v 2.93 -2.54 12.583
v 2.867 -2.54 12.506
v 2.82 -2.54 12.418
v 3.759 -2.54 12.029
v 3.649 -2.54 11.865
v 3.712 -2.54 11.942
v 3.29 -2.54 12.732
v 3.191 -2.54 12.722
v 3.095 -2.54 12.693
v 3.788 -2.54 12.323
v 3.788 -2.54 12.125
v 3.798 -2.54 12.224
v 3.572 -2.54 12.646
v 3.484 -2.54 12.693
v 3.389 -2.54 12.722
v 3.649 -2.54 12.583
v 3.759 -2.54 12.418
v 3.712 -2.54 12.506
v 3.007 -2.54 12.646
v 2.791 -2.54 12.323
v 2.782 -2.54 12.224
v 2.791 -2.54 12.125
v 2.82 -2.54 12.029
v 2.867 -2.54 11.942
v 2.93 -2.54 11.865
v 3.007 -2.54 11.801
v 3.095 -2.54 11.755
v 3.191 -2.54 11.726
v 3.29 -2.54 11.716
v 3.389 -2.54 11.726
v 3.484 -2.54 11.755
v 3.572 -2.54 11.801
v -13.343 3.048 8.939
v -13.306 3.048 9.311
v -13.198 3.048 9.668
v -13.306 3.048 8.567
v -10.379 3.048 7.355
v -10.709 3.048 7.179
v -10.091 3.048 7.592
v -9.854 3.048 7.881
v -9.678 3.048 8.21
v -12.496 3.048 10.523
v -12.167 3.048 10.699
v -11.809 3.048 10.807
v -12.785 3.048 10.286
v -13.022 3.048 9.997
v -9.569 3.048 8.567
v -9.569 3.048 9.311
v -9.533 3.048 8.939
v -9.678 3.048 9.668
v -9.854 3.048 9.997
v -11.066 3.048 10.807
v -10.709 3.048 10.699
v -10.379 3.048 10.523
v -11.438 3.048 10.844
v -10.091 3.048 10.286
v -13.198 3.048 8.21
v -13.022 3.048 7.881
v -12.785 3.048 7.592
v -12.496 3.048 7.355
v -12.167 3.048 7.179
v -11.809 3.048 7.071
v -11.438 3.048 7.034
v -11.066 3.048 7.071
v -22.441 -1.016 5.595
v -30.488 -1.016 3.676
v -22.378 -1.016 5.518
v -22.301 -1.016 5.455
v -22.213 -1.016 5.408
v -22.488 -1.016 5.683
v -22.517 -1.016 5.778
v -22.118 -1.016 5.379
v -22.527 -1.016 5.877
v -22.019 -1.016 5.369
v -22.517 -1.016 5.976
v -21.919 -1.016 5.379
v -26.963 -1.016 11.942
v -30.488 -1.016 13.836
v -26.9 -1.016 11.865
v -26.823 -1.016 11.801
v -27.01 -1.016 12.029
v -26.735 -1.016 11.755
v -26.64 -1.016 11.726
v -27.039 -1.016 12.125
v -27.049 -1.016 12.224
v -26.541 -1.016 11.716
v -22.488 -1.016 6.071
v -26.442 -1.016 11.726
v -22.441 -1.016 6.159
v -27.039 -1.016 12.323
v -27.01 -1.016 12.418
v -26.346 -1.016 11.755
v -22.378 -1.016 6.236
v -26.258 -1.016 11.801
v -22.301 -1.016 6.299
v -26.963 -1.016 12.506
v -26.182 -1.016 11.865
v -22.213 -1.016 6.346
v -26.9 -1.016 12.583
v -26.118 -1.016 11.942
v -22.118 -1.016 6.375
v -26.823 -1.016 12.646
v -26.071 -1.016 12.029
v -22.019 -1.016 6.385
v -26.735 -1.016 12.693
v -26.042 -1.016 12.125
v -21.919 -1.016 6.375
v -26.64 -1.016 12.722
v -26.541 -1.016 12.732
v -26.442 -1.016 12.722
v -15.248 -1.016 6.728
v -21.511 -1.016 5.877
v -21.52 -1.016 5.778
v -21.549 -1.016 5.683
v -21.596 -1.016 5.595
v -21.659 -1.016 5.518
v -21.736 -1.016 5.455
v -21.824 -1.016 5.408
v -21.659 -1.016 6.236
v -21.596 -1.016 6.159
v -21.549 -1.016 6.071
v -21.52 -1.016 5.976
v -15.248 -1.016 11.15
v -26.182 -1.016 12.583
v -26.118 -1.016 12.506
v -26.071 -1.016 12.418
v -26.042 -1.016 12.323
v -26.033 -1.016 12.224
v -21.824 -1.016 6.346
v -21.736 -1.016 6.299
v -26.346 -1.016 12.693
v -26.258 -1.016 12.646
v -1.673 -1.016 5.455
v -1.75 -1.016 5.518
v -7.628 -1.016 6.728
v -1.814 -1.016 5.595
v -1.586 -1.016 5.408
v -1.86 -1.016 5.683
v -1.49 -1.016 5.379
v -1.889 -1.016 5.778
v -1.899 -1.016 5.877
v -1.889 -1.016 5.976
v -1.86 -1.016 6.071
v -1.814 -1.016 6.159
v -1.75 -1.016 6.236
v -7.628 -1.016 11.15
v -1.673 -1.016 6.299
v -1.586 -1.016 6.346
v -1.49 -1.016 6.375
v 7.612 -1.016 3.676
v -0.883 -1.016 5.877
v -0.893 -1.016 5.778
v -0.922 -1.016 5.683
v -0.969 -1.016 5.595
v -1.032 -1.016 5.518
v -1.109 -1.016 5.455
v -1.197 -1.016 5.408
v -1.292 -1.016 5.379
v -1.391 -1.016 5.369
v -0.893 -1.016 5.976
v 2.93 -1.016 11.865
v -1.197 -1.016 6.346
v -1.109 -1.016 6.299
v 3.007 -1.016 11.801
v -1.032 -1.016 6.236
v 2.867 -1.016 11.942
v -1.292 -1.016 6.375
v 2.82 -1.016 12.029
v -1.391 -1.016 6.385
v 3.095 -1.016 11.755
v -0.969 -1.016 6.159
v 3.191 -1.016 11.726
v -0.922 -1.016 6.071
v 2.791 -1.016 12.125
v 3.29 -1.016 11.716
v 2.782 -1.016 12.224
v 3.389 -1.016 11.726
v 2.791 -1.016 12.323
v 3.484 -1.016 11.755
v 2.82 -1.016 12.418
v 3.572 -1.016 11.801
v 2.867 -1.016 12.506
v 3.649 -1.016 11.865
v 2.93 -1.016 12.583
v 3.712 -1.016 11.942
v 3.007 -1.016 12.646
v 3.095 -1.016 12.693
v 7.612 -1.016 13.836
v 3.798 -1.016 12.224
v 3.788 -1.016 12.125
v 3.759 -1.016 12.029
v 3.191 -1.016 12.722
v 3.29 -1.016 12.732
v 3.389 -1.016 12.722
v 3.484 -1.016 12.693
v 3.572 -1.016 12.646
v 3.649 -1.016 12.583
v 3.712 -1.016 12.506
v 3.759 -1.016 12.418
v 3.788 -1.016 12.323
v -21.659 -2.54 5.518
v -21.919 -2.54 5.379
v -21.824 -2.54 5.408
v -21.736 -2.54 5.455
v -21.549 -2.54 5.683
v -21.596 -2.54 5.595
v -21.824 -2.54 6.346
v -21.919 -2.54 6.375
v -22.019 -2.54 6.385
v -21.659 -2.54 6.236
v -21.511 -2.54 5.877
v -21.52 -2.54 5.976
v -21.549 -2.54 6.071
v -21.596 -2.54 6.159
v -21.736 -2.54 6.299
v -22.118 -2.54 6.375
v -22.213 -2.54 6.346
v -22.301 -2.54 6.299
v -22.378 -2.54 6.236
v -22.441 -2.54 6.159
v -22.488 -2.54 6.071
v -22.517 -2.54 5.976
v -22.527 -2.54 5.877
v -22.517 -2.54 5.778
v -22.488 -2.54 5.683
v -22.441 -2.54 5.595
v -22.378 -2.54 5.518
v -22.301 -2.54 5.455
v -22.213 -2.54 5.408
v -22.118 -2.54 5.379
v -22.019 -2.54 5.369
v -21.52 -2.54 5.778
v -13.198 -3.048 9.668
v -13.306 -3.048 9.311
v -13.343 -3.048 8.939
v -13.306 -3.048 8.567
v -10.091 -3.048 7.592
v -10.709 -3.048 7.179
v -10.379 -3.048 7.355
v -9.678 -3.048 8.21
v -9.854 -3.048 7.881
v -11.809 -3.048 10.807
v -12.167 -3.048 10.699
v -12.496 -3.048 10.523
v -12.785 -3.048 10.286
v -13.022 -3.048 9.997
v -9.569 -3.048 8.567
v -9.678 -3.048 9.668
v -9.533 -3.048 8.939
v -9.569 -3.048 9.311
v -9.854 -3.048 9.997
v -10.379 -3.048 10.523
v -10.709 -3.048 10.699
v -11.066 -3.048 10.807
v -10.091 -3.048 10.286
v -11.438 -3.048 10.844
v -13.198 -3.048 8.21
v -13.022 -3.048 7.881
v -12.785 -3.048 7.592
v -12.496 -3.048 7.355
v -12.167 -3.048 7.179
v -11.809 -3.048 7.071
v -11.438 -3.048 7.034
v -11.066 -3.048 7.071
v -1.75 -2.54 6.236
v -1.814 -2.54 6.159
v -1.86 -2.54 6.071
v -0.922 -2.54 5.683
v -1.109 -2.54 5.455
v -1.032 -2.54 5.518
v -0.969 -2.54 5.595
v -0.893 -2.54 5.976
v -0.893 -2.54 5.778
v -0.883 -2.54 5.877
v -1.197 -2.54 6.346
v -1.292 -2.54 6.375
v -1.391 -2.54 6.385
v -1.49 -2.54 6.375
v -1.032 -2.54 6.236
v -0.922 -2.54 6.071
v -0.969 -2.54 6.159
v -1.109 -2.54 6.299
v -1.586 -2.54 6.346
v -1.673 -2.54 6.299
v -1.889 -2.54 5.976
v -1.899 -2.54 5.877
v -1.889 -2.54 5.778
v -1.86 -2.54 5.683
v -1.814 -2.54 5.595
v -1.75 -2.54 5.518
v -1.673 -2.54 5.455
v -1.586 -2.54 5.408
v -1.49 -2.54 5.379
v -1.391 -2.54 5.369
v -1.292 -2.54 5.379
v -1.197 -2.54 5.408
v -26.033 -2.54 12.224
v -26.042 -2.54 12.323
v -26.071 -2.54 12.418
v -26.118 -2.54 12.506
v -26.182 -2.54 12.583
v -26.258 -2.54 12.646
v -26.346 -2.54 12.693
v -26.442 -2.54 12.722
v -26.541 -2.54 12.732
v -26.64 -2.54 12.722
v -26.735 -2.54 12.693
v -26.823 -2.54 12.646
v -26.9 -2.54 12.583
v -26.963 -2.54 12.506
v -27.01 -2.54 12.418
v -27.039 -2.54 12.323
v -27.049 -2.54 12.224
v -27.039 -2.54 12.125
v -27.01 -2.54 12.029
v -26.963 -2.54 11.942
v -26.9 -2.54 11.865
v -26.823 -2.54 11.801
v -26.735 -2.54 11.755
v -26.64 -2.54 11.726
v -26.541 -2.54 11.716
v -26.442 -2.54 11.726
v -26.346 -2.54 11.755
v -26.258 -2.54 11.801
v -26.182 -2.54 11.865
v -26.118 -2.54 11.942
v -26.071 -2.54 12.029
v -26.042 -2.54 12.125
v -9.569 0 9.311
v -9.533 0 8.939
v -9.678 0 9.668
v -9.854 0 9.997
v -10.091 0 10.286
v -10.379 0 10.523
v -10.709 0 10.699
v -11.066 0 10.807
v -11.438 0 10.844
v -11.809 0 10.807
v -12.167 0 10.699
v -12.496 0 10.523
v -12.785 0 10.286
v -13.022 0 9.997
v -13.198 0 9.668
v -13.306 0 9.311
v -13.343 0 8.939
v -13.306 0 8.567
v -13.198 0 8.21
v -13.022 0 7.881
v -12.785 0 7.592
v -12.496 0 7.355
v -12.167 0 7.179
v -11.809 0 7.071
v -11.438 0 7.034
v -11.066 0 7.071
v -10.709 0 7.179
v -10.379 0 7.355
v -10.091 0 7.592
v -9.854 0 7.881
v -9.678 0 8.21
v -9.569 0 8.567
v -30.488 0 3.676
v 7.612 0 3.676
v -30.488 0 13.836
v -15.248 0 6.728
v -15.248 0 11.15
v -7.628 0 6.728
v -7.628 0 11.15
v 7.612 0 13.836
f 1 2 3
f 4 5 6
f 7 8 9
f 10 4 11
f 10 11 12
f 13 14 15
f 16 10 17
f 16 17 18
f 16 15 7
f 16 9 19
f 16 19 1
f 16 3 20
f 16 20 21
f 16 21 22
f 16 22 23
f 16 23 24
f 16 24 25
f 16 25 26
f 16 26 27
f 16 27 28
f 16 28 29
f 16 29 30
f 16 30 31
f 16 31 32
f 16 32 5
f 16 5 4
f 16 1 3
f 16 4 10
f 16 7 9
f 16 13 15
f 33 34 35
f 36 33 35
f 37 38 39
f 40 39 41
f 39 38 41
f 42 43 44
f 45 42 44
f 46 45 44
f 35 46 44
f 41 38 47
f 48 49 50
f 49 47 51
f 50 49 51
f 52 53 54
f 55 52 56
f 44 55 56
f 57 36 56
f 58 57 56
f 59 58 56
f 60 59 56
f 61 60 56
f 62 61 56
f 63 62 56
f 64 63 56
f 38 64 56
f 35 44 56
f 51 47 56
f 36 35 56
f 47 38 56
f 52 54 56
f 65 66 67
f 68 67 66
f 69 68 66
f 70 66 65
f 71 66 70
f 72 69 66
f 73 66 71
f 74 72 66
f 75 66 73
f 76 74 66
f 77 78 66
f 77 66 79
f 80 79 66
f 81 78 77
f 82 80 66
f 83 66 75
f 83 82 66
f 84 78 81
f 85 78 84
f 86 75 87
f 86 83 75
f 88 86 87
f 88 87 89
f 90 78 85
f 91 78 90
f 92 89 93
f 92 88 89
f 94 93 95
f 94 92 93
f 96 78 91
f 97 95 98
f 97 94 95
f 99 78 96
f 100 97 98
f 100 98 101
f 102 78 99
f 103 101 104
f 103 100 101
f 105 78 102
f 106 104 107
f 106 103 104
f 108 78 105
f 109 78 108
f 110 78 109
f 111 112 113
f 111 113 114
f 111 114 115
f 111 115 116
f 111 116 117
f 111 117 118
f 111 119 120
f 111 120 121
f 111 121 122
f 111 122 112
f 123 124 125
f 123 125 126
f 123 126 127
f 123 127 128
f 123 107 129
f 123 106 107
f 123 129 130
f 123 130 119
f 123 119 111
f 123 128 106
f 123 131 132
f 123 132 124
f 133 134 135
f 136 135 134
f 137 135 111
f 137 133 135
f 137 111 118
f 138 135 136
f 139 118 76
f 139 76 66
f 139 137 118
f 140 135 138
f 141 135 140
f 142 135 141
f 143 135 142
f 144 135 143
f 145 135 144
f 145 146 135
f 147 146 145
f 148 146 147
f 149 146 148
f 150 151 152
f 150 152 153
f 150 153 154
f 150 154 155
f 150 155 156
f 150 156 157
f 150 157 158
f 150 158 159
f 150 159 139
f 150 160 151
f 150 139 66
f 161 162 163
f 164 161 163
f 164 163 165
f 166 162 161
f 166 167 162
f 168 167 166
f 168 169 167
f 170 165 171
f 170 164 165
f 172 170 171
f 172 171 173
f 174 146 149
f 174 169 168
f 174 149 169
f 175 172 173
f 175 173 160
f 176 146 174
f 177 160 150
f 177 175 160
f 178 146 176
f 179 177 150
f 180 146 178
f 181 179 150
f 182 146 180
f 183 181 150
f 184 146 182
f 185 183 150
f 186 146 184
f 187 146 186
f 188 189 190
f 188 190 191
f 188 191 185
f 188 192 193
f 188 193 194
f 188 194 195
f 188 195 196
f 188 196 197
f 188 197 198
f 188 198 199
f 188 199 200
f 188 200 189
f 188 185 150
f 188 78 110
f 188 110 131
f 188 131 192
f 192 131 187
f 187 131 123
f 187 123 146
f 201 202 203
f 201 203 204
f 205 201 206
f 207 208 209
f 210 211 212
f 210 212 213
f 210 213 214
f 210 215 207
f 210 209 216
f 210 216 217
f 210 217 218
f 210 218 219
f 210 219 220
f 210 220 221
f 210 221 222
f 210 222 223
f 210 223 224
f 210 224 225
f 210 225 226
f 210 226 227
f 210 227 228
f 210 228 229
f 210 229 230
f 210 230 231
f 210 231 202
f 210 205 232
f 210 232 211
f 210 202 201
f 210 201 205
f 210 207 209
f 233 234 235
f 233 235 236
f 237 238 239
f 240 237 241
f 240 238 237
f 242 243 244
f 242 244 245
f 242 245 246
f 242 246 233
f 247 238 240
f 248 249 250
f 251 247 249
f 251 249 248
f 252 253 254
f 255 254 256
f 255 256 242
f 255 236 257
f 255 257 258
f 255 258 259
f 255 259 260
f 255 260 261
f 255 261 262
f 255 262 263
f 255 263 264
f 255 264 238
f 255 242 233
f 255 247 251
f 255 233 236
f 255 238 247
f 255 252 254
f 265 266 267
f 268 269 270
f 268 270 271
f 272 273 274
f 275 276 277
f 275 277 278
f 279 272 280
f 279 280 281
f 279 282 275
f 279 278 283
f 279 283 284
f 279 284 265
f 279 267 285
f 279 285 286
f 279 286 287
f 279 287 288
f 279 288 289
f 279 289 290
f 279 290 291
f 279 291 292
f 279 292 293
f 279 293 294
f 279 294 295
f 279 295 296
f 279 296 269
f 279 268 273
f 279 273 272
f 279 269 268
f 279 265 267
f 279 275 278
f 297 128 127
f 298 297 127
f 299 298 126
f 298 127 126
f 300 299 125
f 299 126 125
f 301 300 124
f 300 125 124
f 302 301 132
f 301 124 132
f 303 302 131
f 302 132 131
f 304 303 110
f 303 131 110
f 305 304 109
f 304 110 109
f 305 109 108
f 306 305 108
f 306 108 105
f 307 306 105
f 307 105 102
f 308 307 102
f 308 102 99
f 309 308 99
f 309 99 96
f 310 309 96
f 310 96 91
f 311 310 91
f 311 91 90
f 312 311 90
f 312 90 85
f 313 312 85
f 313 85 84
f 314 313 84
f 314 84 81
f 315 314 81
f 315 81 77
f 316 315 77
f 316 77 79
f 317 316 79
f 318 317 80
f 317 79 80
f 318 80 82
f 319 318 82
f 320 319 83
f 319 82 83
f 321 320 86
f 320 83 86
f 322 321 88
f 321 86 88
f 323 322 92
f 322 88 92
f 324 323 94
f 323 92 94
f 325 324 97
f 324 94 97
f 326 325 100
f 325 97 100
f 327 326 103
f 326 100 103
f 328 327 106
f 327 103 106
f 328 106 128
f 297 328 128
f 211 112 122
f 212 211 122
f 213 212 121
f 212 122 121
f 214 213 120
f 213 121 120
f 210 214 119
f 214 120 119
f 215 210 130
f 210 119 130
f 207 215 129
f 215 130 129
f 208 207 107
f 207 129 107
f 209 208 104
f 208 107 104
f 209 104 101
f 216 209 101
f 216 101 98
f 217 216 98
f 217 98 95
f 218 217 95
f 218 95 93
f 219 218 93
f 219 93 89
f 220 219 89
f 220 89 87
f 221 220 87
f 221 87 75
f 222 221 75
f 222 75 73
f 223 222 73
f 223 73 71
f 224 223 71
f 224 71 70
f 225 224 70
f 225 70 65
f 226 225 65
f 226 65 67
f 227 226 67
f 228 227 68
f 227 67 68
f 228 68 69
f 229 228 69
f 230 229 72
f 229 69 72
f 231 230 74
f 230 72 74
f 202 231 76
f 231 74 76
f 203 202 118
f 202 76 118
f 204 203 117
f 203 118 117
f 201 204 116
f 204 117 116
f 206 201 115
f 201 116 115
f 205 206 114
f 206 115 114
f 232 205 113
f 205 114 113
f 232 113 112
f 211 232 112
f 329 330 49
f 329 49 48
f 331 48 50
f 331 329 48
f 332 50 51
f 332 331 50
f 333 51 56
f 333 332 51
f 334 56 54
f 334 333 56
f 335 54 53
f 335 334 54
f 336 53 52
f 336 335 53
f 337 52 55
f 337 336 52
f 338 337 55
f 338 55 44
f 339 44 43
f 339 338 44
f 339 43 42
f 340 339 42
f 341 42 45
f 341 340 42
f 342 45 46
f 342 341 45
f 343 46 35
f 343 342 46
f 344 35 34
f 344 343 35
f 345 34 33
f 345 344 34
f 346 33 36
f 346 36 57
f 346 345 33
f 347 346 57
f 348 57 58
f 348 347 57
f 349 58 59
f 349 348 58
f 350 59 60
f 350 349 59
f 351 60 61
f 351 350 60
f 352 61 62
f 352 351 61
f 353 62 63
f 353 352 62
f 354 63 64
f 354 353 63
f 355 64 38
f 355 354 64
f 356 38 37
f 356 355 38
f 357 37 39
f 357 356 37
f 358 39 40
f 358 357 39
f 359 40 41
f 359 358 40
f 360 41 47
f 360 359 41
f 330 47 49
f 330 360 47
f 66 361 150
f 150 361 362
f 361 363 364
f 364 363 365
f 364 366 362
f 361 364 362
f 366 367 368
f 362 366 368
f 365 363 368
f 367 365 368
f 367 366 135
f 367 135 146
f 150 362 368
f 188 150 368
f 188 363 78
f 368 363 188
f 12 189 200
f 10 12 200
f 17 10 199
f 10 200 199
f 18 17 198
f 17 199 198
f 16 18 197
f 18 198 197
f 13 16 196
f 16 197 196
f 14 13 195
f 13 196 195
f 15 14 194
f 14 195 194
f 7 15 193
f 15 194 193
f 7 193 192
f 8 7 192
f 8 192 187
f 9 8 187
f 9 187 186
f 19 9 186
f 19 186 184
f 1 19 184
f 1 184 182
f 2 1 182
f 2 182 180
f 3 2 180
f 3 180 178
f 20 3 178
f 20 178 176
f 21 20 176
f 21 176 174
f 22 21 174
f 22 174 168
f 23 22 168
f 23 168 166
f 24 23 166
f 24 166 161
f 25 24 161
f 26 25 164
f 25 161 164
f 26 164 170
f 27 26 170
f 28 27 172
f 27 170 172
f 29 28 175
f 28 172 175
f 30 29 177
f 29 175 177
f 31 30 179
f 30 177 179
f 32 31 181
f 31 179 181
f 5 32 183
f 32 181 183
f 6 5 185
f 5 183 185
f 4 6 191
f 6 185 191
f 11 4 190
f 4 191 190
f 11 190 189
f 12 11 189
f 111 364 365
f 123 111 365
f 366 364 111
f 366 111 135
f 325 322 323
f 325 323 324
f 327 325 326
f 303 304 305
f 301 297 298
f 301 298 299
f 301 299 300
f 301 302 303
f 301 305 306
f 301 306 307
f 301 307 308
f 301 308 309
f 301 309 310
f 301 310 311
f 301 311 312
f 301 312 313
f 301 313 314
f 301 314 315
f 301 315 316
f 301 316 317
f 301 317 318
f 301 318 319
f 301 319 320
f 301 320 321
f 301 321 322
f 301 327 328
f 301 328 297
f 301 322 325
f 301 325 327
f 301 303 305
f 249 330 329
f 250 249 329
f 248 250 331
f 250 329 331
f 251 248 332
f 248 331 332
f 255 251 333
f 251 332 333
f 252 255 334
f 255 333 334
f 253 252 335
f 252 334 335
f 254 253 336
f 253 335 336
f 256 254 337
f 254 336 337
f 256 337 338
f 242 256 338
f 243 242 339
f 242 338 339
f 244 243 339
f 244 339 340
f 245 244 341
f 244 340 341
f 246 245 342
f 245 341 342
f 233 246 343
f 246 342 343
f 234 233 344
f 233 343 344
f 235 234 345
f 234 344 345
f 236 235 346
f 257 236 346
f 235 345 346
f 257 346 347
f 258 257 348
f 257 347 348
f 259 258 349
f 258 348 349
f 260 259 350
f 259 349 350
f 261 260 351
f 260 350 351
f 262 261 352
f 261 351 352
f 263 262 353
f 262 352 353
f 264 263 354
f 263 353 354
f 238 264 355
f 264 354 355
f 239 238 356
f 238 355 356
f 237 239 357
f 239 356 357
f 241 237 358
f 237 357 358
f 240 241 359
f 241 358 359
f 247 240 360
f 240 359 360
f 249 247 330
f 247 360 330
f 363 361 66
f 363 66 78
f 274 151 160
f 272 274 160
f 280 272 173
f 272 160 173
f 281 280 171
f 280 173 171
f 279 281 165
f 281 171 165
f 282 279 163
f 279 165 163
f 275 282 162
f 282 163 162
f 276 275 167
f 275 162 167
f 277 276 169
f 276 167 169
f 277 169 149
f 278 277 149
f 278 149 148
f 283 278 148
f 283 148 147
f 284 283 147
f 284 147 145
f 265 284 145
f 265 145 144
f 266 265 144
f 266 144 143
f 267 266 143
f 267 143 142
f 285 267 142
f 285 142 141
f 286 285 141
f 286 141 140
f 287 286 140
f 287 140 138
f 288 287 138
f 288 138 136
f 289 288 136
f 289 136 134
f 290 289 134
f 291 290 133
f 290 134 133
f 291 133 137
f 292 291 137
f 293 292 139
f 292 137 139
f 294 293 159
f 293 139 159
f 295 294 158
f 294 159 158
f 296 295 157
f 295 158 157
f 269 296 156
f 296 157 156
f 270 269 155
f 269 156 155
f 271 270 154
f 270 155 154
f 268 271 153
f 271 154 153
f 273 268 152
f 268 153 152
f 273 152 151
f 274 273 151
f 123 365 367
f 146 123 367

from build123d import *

# Parameters (mm, degrees)
F0_W          = 38.1
F0_H          = 10.16
F1_DEPTH      = 1.016
F2_R          = 0.508
F3_DEPTH      = 2.54
F4_W          = 7.62
F4_H          = 4.4223206656
F5_DEPTH      = 2.54
F6_R          = 1.905
F7_DEPTH      = 3.048
F7_DEPTH_BACK = 3.048


with BuildPart() as f1:
    # F0 (on Front) → F1 (new body)
    with BuildSketch(Plane.XZ):
        with Locations((-11.4378130529, 8.7561514427)):
            Rectangle(F0_W, F0_H)
    extrude(amount=F1_DEPTH)

    # F2 (on Front) → F3 (join)
    with BuildSketch(Plane.XZ):
        with Locations((3.2896965753, 12.2238437514)):
            Circle(F2_R)
        with Locations((-1.3911404423, 5.8769460577)):
            Circle(F2_R)
        with Locations((-26.5407218297, 12.2238437514)):
            Circle(F2_R)
        with Locations((-22.0185570657, 5.8769460577)):
            Circle(F2_R)
    extrude(amount=F3_DEPTH)

    # F4 (on Front) → F5 (cut)
    with BuildSketch(Plane.XZ):
        with Locations((-11.4378130529, 8.9389616624)):
            Rectangle(F4_W, F4_H)
    extrude(amount=F5_DEPTH, mode=Mode.SUBTRACT)


with BuildPart() as f7:
    # F6 (on Front) → F7 (new body, two sides)
    with BuildSketch(Plane.XZ) as f7_sk:
        with Locations((-11.4378130529, 8.9389616624)):
            Circle(F6_R)
    extrude(amount=-F7_DEPTH)
    extrude(f7_sk.sketch, amount=F7_DEPTH_BACK)


solid = Compound([f1.part, f7.part])
